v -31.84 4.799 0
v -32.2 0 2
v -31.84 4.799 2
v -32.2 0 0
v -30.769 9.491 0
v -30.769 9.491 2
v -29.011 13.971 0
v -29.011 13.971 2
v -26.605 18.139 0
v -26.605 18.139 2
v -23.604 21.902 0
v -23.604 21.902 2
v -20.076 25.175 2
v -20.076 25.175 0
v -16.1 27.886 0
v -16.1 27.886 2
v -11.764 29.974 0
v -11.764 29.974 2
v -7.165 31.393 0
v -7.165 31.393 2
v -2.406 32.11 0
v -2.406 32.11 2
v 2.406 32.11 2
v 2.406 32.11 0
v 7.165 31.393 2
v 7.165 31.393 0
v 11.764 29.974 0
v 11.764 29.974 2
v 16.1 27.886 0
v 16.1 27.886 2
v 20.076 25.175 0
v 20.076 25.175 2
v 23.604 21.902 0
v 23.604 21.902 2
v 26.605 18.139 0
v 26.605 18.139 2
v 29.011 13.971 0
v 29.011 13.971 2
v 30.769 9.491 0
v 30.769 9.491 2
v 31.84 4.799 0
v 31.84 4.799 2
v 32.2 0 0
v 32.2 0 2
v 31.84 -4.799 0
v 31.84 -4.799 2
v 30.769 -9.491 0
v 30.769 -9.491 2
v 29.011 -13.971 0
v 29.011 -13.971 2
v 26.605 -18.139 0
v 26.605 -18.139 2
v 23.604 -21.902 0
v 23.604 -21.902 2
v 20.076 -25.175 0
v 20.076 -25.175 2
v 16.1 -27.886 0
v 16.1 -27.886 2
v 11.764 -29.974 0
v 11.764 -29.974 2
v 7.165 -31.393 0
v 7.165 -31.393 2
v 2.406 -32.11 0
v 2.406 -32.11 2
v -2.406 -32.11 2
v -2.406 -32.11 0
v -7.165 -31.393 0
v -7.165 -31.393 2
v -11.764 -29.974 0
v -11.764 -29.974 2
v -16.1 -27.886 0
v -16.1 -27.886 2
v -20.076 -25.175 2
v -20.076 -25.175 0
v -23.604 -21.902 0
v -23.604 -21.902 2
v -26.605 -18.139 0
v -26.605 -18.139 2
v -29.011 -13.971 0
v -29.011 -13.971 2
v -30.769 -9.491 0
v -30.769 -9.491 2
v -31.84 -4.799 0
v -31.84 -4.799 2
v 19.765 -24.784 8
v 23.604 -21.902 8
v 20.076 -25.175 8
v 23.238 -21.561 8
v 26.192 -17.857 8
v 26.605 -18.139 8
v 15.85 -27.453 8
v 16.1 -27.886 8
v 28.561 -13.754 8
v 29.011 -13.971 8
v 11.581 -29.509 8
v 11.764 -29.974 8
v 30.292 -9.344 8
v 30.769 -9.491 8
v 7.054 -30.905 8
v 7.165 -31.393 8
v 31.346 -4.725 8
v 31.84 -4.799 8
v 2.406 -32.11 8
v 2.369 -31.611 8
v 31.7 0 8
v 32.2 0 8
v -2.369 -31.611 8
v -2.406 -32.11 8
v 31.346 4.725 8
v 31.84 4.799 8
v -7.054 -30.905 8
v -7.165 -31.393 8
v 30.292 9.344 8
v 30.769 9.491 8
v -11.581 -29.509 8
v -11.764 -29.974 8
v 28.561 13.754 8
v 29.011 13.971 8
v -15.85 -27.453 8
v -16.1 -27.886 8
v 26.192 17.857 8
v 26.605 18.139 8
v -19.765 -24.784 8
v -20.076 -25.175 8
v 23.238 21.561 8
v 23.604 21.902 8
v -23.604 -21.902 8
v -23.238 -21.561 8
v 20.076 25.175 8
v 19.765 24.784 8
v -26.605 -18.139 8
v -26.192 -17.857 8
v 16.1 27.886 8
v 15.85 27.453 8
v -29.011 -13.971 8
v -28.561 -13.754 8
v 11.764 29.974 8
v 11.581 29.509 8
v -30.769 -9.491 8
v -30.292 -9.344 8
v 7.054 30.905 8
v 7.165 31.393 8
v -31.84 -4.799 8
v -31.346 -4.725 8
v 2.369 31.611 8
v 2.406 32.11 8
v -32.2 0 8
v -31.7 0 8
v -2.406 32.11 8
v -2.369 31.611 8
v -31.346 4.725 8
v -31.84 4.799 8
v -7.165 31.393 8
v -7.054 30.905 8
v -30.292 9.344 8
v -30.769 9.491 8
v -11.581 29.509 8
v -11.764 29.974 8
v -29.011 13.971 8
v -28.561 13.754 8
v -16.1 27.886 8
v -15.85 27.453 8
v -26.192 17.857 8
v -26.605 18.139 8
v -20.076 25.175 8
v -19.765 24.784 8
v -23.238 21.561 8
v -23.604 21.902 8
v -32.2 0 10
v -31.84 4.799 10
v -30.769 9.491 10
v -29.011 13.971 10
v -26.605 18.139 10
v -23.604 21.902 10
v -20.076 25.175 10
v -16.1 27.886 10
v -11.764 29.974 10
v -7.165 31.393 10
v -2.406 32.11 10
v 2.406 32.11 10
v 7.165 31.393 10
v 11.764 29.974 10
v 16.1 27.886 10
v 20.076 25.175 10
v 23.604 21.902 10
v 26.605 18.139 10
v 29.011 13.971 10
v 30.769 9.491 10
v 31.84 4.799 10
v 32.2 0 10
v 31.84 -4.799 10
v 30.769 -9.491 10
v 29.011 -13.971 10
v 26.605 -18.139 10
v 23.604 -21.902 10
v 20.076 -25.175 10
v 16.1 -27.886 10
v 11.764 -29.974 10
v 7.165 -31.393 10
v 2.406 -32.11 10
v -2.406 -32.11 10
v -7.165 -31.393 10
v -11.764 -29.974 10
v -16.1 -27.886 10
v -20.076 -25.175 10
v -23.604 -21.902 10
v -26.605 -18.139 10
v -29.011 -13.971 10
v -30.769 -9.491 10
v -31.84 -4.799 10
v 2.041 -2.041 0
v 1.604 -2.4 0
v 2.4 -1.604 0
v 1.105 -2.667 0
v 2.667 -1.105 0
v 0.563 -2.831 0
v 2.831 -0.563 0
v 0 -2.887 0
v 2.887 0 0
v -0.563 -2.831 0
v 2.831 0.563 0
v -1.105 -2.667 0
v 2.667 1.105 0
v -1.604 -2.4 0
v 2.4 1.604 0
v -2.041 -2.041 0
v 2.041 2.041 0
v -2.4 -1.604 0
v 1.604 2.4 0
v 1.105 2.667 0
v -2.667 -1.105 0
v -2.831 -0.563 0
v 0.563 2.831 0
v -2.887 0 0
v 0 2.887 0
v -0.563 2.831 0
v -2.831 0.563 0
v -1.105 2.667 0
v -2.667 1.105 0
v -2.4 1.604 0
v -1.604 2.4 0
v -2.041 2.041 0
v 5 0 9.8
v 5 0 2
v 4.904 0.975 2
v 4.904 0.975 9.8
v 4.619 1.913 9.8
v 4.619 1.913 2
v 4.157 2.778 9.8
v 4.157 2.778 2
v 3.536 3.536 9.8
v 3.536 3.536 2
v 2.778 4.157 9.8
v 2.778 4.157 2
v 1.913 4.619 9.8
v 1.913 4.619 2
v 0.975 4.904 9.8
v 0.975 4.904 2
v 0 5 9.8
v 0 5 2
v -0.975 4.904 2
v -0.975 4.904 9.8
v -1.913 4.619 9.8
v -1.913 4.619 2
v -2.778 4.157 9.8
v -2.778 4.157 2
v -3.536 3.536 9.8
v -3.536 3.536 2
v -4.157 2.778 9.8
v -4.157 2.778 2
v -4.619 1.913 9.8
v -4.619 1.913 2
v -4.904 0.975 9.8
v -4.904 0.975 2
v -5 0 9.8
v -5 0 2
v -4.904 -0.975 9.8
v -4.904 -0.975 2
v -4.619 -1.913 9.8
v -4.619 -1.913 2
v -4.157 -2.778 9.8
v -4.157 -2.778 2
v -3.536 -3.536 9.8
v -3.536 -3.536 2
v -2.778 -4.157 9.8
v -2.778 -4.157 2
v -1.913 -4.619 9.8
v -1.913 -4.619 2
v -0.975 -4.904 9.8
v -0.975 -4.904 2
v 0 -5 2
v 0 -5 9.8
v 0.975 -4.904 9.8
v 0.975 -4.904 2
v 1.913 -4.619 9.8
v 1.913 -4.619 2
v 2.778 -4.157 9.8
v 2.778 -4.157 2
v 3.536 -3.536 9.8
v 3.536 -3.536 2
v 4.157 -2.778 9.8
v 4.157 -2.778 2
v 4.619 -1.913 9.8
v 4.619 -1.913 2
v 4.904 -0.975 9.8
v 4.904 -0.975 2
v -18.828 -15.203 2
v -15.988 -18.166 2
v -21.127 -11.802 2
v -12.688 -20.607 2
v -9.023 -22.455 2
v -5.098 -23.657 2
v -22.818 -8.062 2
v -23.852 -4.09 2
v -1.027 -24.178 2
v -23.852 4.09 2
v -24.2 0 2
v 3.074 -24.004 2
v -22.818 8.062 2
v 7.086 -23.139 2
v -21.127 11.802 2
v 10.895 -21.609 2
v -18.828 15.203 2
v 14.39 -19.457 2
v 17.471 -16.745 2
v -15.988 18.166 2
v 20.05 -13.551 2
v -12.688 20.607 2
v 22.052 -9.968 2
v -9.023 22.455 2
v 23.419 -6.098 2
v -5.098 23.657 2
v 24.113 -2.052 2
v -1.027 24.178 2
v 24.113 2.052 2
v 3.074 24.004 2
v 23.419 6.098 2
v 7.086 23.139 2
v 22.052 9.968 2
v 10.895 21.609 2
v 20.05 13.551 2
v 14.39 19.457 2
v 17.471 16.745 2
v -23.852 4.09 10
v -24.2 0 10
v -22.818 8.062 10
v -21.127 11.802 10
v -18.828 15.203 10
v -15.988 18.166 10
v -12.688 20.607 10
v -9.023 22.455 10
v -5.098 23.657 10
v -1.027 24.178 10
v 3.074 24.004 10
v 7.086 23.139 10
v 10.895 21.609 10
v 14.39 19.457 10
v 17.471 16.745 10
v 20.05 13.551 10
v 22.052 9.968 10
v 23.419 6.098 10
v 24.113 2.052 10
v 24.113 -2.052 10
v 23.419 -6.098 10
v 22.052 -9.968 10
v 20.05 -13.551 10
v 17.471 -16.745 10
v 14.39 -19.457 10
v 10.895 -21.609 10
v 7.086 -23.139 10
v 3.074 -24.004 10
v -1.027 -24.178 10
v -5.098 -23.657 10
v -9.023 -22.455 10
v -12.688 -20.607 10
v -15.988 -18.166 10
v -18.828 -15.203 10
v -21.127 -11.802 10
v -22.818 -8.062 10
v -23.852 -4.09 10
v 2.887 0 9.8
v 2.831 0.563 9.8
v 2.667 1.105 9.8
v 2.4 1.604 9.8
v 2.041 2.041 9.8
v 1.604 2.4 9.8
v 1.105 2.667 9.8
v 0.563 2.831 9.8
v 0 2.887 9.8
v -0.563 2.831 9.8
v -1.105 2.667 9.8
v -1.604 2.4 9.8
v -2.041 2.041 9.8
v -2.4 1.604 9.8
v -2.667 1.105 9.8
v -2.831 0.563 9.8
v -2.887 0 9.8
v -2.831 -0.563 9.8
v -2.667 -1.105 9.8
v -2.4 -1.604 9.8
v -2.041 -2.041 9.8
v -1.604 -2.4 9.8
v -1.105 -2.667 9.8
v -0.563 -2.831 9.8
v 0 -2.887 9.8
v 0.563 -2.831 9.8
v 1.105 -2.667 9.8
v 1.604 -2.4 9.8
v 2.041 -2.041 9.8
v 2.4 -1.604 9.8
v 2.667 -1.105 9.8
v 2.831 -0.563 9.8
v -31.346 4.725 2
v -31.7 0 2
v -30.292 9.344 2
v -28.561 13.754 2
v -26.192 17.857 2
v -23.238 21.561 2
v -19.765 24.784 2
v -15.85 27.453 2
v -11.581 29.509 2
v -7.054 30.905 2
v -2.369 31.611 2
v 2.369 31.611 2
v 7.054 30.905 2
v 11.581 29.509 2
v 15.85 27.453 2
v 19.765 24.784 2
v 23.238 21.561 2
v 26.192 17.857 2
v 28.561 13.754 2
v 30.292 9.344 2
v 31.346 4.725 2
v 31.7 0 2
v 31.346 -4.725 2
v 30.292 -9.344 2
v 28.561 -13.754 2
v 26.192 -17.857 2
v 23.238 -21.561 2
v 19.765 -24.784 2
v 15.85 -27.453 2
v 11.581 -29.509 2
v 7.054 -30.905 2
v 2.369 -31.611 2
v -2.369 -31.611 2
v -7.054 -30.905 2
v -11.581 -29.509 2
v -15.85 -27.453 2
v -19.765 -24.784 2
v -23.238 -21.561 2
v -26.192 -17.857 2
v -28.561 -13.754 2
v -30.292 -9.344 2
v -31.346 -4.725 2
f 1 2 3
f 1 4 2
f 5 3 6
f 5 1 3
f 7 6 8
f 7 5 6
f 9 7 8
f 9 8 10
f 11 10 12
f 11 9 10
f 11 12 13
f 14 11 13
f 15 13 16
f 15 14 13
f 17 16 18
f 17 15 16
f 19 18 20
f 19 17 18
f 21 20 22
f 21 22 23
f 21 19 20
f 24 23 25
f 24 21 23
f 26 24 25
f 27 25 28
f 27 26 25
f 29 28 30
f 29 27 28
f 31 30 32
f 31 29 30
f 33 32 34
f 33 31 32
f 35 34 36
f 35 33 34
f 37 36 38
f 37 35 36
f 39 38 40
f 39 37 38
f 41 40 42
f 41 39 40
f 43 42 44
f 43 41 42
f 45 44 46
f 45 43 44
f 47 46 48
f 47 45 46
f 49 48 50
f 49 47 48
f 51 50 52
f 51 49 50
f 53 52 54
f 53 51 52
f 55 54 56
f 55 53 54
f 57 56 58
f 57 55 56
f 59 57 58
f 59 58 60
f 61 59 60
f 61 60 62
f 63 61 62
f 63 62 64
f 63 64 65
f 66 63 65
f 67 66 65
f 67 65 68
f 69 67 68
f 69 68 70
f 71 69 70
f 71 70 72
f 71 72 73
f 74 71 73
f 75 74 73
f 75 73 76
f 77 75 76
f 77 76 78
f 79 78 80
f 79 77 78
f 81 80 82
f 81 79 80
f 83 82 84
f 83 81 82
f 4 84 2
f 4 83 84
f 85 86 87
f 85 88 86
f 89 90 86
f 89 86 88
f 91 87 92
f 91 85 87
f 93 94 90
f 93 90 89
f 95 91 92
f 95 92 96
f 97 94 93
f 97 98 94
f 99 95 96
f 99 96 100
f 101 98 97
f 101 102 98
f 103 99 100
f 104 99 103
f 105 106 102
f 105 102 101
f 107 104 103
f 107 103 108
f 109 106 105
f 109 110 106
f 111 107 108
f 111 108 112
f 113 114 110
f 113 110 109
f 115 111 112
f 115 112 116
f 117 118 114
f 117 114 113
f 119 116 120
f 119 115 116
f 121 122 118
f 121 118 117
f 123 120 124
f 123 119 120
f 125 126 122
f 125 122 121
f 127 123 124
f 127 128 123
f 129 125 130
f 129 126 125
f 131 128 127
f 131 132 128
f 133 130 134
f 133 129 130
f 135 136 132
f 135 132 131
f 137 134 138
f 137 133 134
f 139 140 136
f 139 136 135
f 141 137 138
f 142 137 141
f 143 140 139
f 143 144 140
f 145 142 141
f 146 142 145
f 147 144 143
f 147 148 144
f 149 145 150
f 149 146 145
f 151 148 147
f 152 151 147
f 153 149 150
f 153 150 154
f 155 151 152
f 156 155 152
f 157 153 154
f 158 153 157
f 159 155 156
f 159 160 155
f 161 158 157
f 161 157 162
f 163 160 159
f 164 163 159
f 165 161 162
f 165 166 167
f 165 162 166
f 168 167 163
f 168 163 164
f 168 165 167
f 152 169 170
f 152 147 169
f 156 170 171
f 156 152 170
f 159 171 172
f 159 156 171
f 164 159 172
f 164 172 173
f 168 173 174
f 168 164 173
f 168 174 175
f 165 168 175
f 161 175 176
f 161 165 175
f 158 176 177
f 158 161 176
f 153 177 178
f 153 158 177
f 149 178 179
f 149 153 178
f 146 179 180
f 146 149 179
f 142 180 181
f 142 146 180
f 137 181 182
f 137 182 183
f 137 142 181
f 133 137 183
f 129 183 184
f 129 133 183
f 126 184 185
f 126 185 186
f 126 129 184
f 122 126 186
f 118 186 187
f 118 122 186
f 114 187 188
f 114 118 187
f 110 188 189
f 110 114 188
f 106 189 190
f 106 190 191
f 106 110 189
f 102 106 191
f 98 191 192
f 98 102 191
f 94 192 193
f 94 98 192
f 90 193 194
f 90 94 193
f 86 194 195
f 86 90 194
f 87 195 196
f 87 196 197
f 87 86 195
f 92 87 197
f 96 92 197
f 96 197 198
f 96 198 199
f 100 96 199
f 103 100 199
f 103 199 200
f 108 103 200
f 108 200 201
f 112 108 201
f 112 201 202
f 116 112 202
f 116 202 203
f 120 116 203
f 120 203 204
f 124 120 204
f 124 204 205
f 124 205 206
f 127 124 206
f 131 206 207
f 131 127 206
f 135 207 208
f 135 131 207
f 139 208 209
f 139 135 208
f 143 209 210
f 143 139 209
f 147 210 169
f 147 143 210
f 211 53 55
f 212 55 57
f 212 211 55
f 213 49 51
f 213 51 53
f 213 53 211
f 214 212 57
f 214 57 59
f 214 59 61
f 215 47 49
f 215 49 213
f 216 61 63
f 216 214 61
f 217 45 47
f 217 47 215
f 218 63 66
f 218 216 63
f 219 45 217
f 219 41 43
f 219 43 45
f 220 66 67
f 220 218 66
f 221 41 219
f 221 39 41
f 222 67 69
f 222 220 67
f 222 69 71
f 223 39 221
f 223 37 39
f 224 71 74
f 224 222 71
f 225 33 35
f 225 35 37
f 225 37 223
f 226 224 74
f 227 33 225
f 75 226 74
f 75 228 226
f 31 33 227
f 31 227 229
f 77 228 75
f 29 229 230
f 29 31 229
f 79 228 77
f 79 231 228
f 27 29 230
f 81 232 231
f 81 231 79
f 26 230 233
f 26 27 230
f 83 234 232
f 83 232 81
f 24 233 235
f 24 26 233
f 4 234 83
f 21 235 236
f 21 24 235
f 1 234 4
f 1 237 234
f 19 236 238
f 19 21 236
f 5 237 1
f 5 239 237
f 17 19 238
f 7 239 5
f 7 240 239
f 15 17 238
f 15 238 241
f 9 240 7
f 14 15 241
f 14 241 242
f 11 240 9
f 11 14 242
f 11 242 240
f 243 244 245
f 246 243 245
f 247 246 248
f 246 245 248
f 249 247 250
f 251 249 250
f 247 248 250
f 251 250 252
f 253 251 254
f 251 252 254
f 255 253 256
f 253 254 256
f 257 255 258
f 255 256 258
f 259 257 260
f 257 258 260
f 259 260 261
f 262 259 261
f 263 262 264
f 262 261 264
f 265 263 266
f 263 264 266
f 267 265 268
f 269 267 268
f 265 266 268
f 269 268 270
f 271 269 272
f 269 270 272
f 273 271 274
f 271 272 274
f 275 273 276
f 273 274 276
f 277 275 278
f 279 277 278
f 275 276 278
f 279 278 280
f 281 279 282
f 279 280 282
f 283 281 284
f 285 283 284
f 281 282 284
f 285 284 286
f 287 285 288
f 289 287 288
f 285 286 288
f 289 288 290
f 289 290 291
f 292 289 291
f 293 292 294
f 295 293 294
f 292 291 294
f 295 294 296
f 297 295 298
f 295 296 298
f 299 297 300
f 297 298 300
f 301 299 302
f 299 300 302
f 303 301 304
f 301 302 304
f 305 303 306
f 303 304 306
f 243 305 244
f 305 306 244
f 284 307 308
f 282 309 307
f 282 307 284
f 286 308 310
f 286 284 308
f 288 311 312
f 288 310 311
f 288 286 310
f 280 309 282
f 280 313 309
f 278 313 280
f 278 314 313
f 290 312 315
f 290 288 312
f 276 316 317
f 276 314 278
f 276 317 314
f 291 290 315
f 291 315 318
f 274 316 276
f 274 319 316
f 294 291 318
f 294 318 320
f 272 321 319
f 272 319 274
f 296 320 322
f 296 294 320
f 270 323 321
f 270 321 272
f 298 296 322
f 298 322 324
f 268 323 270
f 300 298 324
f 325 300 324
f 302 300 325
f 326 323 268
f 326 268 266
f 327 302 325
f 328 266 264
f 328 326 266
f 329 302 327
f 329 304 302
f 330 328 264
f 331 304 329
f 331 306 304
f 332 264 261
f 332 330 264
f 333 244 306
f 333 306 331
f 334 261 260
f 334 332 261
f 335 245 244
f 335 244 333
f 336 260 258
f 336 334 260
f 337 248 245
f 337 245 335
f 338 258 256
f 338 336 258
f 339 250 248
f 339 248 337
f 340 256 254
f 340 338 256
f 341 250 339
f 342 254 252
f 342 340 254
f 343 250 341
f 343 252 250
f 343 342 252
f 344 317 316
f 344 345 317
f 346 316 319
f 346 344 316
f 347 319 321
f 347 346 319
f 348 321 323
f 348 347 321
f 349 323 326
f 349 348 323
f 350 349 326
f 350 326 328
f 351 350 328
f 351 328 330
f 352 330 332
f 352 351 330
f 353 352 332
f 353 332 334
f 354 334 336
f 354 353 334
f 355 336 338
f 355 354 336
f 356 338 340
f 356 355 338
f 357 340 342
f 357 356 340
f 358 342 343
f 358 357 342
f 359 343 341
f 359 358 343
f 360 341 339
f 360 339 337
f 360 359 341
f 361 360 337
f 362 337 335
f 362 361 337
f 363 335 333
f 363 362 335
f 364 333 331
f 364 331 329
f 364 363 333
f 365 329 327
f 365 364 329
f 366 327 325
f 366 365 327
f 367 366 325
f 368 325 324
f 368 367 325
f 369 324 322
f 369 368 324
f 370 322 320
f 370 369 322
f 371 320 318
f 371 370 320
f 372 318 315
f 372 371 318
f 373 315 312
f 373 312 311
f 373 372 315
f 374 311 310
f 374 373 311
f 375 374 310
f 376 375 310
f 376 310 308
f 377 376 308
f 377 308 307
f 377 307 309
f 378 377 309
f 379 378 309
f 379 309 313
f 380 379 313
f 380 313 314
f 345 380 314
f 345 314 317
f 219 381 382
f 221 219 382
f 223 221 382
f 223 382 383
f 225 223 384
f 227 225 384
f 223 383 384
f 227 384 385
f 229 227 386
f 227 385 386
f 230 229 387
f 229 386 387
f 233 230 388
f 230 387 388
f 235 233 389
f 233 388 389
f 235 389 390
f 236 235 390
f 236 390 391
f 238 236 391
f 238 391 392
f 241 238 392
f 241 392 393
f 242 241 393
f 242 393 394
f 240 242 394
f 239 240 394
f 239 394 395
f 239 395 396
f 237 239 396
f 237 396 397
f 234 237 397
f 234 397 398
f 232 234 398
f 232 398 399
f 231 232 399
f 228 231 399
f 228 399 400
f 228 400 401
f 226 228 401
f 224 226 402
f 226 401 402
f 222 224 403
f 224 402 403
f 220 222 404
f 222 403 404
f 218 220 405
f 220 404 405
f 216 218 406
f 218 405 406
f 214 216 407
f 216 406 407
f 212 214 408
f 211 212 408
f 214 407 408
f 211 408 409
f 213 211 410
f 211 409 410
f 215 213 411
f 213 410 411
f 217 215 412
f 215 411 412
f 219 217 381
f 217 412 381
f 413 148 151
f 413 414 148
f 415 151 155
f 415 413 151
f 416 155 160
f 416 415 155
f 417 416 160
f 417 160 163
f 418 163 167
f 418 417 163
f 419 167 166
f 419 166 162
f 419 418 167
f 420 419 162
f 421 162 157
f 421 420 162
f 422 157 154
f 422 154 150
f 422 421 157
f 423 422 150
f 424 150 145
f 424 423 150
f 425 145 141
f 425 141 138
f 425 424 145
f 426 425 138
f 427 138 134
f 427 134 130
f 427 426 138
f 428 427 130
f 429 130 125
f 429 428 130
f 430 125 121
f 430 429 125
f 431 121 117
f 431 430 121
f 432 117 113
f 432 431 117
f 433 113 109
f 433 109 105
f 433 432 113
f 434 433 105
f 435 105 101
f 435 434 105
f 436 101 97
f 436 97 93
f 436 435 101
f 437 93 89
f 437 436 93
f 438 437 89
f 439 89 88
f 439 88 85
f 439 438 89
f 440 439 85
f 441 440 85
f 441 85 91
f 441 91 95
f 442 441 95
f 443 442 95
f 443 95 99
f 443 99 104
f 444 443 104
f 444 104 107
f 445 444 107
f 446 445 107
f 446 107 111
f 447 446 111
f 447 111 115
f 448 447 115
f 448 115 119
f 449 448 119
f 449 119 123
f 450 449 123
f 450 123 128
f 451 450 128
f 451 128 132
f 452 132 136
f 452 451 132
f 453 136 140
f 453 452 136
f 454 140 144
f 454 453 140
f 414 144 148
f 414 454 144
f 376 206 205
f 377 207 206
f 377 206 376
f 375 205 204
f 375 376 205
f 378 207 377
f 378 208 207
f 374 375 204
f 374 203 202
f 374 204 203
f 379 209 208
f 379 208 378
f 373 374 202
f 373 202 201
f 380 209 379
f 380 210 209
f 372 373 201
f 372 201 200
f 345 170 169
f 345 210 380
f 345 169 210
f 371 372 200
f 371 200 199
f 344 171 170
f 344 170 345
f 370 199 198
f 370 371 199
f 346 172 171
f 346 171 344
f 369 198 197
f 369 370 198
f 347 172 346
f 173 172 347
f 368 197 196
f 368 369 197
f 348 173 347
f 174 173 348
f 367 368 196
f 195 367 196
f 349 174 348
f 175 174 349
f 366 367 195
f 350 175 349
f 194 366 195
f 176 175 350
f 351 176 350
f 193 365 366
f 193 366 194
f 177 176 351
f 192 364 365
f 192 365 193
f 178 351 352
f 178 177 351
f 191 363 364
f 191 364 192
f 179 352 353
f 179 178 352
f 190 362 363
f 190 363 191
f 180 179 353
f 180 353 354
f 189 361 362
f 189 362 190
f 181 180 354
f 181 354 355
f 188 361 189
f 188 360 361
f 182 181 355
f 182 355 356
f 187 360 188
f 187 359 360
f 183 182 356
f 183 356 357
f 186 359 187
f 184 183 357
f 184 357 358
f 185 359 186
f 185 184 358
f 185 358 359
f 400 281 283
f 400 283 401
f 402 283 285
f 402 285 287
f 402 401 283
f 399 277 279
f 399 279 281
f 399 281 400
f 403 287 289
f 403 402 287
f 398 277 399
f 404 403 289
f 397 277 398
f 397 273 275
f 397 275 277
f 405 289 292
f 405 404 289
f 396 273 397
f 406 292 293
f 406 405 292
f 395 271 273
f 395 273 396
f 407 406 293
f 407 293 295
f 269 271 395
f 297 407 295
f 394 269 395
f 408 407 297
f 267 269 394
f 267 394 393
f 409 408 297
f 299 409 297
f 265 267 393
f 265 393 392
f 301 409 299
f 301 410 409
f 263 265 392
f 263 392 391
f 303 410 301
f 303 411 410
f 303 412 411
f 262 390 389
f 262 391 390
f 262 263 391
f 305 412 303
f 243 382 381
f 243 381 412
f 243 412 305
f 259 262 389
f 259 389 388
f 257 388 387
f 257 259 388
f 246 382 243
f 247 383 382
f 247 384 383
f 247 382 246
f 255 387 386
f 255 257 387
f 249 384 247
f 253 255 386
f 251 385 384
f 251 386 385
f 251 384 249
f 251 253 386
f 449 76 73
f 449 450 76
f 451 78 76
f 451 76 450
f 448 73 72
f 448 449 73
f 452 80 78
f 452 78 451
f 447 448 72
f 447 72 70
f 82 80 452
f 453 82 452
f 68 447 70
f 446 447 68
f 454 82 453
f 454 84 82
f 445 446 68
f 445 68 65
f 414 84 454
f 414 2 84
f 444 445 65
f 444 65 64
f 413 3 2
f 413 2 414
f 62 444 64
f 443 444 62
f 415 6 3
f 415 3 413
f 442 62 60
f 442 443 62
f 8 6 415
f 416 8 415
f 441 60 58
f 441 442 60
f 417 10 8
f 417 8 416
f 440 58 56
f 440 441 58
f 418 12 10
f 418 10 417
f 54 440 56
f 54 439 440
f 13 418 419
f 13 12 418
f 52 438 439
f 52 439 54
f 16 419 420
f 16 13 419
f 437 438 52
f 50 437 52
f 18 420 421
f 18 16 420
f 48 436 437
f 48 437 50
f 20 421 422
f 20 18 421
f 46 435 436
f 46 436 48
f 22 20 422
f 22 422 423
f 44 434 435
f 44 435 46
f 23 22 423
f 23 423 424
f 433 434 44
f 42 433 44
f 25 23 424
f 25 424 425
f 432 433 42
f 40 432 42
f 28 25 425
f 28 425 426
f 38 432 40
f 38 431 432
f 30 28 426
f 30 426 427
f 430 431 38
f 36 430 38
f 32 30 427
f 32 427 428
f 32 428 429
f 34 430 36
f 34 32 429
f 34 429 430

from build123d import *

# Parameters (mm, degrees)
F2_R     = 5
F3_DEPTH = 7.8
F4_R     = 2.88696
F5_DEPTH = 25


with BuildPart() as f1:
    # F0 (on Front) → F1 (revolve)
    with BuildSketch(Plane.XZ):
        Polygon((-32.2, 0), (0, 0), (0, 2), (-24.2, 2), (-24.2, 10), (-32.2, 10), (-32.2, 8), (-31.7, 8), (-31.7, 2), (-32.2, 2), align=None)
    revolve(axis=Axis((0, 0, 1), (0, 0, -1)))

    # F2 (on face) → F3 (join)
    with BuildSketch(Plane.XY.offset(2)):
        Circle(F2_R)
    extrude(amount=F3_DEPTH)

    # F4 (on face) → F5 (cut)
    with BuildSketch(Plane.XY.offset(9.8)):
        Circle(F4_R)
    extrude(amount=-F5_DEPTH, mode=Mode.SUBTRACT)


solid = f1.part
